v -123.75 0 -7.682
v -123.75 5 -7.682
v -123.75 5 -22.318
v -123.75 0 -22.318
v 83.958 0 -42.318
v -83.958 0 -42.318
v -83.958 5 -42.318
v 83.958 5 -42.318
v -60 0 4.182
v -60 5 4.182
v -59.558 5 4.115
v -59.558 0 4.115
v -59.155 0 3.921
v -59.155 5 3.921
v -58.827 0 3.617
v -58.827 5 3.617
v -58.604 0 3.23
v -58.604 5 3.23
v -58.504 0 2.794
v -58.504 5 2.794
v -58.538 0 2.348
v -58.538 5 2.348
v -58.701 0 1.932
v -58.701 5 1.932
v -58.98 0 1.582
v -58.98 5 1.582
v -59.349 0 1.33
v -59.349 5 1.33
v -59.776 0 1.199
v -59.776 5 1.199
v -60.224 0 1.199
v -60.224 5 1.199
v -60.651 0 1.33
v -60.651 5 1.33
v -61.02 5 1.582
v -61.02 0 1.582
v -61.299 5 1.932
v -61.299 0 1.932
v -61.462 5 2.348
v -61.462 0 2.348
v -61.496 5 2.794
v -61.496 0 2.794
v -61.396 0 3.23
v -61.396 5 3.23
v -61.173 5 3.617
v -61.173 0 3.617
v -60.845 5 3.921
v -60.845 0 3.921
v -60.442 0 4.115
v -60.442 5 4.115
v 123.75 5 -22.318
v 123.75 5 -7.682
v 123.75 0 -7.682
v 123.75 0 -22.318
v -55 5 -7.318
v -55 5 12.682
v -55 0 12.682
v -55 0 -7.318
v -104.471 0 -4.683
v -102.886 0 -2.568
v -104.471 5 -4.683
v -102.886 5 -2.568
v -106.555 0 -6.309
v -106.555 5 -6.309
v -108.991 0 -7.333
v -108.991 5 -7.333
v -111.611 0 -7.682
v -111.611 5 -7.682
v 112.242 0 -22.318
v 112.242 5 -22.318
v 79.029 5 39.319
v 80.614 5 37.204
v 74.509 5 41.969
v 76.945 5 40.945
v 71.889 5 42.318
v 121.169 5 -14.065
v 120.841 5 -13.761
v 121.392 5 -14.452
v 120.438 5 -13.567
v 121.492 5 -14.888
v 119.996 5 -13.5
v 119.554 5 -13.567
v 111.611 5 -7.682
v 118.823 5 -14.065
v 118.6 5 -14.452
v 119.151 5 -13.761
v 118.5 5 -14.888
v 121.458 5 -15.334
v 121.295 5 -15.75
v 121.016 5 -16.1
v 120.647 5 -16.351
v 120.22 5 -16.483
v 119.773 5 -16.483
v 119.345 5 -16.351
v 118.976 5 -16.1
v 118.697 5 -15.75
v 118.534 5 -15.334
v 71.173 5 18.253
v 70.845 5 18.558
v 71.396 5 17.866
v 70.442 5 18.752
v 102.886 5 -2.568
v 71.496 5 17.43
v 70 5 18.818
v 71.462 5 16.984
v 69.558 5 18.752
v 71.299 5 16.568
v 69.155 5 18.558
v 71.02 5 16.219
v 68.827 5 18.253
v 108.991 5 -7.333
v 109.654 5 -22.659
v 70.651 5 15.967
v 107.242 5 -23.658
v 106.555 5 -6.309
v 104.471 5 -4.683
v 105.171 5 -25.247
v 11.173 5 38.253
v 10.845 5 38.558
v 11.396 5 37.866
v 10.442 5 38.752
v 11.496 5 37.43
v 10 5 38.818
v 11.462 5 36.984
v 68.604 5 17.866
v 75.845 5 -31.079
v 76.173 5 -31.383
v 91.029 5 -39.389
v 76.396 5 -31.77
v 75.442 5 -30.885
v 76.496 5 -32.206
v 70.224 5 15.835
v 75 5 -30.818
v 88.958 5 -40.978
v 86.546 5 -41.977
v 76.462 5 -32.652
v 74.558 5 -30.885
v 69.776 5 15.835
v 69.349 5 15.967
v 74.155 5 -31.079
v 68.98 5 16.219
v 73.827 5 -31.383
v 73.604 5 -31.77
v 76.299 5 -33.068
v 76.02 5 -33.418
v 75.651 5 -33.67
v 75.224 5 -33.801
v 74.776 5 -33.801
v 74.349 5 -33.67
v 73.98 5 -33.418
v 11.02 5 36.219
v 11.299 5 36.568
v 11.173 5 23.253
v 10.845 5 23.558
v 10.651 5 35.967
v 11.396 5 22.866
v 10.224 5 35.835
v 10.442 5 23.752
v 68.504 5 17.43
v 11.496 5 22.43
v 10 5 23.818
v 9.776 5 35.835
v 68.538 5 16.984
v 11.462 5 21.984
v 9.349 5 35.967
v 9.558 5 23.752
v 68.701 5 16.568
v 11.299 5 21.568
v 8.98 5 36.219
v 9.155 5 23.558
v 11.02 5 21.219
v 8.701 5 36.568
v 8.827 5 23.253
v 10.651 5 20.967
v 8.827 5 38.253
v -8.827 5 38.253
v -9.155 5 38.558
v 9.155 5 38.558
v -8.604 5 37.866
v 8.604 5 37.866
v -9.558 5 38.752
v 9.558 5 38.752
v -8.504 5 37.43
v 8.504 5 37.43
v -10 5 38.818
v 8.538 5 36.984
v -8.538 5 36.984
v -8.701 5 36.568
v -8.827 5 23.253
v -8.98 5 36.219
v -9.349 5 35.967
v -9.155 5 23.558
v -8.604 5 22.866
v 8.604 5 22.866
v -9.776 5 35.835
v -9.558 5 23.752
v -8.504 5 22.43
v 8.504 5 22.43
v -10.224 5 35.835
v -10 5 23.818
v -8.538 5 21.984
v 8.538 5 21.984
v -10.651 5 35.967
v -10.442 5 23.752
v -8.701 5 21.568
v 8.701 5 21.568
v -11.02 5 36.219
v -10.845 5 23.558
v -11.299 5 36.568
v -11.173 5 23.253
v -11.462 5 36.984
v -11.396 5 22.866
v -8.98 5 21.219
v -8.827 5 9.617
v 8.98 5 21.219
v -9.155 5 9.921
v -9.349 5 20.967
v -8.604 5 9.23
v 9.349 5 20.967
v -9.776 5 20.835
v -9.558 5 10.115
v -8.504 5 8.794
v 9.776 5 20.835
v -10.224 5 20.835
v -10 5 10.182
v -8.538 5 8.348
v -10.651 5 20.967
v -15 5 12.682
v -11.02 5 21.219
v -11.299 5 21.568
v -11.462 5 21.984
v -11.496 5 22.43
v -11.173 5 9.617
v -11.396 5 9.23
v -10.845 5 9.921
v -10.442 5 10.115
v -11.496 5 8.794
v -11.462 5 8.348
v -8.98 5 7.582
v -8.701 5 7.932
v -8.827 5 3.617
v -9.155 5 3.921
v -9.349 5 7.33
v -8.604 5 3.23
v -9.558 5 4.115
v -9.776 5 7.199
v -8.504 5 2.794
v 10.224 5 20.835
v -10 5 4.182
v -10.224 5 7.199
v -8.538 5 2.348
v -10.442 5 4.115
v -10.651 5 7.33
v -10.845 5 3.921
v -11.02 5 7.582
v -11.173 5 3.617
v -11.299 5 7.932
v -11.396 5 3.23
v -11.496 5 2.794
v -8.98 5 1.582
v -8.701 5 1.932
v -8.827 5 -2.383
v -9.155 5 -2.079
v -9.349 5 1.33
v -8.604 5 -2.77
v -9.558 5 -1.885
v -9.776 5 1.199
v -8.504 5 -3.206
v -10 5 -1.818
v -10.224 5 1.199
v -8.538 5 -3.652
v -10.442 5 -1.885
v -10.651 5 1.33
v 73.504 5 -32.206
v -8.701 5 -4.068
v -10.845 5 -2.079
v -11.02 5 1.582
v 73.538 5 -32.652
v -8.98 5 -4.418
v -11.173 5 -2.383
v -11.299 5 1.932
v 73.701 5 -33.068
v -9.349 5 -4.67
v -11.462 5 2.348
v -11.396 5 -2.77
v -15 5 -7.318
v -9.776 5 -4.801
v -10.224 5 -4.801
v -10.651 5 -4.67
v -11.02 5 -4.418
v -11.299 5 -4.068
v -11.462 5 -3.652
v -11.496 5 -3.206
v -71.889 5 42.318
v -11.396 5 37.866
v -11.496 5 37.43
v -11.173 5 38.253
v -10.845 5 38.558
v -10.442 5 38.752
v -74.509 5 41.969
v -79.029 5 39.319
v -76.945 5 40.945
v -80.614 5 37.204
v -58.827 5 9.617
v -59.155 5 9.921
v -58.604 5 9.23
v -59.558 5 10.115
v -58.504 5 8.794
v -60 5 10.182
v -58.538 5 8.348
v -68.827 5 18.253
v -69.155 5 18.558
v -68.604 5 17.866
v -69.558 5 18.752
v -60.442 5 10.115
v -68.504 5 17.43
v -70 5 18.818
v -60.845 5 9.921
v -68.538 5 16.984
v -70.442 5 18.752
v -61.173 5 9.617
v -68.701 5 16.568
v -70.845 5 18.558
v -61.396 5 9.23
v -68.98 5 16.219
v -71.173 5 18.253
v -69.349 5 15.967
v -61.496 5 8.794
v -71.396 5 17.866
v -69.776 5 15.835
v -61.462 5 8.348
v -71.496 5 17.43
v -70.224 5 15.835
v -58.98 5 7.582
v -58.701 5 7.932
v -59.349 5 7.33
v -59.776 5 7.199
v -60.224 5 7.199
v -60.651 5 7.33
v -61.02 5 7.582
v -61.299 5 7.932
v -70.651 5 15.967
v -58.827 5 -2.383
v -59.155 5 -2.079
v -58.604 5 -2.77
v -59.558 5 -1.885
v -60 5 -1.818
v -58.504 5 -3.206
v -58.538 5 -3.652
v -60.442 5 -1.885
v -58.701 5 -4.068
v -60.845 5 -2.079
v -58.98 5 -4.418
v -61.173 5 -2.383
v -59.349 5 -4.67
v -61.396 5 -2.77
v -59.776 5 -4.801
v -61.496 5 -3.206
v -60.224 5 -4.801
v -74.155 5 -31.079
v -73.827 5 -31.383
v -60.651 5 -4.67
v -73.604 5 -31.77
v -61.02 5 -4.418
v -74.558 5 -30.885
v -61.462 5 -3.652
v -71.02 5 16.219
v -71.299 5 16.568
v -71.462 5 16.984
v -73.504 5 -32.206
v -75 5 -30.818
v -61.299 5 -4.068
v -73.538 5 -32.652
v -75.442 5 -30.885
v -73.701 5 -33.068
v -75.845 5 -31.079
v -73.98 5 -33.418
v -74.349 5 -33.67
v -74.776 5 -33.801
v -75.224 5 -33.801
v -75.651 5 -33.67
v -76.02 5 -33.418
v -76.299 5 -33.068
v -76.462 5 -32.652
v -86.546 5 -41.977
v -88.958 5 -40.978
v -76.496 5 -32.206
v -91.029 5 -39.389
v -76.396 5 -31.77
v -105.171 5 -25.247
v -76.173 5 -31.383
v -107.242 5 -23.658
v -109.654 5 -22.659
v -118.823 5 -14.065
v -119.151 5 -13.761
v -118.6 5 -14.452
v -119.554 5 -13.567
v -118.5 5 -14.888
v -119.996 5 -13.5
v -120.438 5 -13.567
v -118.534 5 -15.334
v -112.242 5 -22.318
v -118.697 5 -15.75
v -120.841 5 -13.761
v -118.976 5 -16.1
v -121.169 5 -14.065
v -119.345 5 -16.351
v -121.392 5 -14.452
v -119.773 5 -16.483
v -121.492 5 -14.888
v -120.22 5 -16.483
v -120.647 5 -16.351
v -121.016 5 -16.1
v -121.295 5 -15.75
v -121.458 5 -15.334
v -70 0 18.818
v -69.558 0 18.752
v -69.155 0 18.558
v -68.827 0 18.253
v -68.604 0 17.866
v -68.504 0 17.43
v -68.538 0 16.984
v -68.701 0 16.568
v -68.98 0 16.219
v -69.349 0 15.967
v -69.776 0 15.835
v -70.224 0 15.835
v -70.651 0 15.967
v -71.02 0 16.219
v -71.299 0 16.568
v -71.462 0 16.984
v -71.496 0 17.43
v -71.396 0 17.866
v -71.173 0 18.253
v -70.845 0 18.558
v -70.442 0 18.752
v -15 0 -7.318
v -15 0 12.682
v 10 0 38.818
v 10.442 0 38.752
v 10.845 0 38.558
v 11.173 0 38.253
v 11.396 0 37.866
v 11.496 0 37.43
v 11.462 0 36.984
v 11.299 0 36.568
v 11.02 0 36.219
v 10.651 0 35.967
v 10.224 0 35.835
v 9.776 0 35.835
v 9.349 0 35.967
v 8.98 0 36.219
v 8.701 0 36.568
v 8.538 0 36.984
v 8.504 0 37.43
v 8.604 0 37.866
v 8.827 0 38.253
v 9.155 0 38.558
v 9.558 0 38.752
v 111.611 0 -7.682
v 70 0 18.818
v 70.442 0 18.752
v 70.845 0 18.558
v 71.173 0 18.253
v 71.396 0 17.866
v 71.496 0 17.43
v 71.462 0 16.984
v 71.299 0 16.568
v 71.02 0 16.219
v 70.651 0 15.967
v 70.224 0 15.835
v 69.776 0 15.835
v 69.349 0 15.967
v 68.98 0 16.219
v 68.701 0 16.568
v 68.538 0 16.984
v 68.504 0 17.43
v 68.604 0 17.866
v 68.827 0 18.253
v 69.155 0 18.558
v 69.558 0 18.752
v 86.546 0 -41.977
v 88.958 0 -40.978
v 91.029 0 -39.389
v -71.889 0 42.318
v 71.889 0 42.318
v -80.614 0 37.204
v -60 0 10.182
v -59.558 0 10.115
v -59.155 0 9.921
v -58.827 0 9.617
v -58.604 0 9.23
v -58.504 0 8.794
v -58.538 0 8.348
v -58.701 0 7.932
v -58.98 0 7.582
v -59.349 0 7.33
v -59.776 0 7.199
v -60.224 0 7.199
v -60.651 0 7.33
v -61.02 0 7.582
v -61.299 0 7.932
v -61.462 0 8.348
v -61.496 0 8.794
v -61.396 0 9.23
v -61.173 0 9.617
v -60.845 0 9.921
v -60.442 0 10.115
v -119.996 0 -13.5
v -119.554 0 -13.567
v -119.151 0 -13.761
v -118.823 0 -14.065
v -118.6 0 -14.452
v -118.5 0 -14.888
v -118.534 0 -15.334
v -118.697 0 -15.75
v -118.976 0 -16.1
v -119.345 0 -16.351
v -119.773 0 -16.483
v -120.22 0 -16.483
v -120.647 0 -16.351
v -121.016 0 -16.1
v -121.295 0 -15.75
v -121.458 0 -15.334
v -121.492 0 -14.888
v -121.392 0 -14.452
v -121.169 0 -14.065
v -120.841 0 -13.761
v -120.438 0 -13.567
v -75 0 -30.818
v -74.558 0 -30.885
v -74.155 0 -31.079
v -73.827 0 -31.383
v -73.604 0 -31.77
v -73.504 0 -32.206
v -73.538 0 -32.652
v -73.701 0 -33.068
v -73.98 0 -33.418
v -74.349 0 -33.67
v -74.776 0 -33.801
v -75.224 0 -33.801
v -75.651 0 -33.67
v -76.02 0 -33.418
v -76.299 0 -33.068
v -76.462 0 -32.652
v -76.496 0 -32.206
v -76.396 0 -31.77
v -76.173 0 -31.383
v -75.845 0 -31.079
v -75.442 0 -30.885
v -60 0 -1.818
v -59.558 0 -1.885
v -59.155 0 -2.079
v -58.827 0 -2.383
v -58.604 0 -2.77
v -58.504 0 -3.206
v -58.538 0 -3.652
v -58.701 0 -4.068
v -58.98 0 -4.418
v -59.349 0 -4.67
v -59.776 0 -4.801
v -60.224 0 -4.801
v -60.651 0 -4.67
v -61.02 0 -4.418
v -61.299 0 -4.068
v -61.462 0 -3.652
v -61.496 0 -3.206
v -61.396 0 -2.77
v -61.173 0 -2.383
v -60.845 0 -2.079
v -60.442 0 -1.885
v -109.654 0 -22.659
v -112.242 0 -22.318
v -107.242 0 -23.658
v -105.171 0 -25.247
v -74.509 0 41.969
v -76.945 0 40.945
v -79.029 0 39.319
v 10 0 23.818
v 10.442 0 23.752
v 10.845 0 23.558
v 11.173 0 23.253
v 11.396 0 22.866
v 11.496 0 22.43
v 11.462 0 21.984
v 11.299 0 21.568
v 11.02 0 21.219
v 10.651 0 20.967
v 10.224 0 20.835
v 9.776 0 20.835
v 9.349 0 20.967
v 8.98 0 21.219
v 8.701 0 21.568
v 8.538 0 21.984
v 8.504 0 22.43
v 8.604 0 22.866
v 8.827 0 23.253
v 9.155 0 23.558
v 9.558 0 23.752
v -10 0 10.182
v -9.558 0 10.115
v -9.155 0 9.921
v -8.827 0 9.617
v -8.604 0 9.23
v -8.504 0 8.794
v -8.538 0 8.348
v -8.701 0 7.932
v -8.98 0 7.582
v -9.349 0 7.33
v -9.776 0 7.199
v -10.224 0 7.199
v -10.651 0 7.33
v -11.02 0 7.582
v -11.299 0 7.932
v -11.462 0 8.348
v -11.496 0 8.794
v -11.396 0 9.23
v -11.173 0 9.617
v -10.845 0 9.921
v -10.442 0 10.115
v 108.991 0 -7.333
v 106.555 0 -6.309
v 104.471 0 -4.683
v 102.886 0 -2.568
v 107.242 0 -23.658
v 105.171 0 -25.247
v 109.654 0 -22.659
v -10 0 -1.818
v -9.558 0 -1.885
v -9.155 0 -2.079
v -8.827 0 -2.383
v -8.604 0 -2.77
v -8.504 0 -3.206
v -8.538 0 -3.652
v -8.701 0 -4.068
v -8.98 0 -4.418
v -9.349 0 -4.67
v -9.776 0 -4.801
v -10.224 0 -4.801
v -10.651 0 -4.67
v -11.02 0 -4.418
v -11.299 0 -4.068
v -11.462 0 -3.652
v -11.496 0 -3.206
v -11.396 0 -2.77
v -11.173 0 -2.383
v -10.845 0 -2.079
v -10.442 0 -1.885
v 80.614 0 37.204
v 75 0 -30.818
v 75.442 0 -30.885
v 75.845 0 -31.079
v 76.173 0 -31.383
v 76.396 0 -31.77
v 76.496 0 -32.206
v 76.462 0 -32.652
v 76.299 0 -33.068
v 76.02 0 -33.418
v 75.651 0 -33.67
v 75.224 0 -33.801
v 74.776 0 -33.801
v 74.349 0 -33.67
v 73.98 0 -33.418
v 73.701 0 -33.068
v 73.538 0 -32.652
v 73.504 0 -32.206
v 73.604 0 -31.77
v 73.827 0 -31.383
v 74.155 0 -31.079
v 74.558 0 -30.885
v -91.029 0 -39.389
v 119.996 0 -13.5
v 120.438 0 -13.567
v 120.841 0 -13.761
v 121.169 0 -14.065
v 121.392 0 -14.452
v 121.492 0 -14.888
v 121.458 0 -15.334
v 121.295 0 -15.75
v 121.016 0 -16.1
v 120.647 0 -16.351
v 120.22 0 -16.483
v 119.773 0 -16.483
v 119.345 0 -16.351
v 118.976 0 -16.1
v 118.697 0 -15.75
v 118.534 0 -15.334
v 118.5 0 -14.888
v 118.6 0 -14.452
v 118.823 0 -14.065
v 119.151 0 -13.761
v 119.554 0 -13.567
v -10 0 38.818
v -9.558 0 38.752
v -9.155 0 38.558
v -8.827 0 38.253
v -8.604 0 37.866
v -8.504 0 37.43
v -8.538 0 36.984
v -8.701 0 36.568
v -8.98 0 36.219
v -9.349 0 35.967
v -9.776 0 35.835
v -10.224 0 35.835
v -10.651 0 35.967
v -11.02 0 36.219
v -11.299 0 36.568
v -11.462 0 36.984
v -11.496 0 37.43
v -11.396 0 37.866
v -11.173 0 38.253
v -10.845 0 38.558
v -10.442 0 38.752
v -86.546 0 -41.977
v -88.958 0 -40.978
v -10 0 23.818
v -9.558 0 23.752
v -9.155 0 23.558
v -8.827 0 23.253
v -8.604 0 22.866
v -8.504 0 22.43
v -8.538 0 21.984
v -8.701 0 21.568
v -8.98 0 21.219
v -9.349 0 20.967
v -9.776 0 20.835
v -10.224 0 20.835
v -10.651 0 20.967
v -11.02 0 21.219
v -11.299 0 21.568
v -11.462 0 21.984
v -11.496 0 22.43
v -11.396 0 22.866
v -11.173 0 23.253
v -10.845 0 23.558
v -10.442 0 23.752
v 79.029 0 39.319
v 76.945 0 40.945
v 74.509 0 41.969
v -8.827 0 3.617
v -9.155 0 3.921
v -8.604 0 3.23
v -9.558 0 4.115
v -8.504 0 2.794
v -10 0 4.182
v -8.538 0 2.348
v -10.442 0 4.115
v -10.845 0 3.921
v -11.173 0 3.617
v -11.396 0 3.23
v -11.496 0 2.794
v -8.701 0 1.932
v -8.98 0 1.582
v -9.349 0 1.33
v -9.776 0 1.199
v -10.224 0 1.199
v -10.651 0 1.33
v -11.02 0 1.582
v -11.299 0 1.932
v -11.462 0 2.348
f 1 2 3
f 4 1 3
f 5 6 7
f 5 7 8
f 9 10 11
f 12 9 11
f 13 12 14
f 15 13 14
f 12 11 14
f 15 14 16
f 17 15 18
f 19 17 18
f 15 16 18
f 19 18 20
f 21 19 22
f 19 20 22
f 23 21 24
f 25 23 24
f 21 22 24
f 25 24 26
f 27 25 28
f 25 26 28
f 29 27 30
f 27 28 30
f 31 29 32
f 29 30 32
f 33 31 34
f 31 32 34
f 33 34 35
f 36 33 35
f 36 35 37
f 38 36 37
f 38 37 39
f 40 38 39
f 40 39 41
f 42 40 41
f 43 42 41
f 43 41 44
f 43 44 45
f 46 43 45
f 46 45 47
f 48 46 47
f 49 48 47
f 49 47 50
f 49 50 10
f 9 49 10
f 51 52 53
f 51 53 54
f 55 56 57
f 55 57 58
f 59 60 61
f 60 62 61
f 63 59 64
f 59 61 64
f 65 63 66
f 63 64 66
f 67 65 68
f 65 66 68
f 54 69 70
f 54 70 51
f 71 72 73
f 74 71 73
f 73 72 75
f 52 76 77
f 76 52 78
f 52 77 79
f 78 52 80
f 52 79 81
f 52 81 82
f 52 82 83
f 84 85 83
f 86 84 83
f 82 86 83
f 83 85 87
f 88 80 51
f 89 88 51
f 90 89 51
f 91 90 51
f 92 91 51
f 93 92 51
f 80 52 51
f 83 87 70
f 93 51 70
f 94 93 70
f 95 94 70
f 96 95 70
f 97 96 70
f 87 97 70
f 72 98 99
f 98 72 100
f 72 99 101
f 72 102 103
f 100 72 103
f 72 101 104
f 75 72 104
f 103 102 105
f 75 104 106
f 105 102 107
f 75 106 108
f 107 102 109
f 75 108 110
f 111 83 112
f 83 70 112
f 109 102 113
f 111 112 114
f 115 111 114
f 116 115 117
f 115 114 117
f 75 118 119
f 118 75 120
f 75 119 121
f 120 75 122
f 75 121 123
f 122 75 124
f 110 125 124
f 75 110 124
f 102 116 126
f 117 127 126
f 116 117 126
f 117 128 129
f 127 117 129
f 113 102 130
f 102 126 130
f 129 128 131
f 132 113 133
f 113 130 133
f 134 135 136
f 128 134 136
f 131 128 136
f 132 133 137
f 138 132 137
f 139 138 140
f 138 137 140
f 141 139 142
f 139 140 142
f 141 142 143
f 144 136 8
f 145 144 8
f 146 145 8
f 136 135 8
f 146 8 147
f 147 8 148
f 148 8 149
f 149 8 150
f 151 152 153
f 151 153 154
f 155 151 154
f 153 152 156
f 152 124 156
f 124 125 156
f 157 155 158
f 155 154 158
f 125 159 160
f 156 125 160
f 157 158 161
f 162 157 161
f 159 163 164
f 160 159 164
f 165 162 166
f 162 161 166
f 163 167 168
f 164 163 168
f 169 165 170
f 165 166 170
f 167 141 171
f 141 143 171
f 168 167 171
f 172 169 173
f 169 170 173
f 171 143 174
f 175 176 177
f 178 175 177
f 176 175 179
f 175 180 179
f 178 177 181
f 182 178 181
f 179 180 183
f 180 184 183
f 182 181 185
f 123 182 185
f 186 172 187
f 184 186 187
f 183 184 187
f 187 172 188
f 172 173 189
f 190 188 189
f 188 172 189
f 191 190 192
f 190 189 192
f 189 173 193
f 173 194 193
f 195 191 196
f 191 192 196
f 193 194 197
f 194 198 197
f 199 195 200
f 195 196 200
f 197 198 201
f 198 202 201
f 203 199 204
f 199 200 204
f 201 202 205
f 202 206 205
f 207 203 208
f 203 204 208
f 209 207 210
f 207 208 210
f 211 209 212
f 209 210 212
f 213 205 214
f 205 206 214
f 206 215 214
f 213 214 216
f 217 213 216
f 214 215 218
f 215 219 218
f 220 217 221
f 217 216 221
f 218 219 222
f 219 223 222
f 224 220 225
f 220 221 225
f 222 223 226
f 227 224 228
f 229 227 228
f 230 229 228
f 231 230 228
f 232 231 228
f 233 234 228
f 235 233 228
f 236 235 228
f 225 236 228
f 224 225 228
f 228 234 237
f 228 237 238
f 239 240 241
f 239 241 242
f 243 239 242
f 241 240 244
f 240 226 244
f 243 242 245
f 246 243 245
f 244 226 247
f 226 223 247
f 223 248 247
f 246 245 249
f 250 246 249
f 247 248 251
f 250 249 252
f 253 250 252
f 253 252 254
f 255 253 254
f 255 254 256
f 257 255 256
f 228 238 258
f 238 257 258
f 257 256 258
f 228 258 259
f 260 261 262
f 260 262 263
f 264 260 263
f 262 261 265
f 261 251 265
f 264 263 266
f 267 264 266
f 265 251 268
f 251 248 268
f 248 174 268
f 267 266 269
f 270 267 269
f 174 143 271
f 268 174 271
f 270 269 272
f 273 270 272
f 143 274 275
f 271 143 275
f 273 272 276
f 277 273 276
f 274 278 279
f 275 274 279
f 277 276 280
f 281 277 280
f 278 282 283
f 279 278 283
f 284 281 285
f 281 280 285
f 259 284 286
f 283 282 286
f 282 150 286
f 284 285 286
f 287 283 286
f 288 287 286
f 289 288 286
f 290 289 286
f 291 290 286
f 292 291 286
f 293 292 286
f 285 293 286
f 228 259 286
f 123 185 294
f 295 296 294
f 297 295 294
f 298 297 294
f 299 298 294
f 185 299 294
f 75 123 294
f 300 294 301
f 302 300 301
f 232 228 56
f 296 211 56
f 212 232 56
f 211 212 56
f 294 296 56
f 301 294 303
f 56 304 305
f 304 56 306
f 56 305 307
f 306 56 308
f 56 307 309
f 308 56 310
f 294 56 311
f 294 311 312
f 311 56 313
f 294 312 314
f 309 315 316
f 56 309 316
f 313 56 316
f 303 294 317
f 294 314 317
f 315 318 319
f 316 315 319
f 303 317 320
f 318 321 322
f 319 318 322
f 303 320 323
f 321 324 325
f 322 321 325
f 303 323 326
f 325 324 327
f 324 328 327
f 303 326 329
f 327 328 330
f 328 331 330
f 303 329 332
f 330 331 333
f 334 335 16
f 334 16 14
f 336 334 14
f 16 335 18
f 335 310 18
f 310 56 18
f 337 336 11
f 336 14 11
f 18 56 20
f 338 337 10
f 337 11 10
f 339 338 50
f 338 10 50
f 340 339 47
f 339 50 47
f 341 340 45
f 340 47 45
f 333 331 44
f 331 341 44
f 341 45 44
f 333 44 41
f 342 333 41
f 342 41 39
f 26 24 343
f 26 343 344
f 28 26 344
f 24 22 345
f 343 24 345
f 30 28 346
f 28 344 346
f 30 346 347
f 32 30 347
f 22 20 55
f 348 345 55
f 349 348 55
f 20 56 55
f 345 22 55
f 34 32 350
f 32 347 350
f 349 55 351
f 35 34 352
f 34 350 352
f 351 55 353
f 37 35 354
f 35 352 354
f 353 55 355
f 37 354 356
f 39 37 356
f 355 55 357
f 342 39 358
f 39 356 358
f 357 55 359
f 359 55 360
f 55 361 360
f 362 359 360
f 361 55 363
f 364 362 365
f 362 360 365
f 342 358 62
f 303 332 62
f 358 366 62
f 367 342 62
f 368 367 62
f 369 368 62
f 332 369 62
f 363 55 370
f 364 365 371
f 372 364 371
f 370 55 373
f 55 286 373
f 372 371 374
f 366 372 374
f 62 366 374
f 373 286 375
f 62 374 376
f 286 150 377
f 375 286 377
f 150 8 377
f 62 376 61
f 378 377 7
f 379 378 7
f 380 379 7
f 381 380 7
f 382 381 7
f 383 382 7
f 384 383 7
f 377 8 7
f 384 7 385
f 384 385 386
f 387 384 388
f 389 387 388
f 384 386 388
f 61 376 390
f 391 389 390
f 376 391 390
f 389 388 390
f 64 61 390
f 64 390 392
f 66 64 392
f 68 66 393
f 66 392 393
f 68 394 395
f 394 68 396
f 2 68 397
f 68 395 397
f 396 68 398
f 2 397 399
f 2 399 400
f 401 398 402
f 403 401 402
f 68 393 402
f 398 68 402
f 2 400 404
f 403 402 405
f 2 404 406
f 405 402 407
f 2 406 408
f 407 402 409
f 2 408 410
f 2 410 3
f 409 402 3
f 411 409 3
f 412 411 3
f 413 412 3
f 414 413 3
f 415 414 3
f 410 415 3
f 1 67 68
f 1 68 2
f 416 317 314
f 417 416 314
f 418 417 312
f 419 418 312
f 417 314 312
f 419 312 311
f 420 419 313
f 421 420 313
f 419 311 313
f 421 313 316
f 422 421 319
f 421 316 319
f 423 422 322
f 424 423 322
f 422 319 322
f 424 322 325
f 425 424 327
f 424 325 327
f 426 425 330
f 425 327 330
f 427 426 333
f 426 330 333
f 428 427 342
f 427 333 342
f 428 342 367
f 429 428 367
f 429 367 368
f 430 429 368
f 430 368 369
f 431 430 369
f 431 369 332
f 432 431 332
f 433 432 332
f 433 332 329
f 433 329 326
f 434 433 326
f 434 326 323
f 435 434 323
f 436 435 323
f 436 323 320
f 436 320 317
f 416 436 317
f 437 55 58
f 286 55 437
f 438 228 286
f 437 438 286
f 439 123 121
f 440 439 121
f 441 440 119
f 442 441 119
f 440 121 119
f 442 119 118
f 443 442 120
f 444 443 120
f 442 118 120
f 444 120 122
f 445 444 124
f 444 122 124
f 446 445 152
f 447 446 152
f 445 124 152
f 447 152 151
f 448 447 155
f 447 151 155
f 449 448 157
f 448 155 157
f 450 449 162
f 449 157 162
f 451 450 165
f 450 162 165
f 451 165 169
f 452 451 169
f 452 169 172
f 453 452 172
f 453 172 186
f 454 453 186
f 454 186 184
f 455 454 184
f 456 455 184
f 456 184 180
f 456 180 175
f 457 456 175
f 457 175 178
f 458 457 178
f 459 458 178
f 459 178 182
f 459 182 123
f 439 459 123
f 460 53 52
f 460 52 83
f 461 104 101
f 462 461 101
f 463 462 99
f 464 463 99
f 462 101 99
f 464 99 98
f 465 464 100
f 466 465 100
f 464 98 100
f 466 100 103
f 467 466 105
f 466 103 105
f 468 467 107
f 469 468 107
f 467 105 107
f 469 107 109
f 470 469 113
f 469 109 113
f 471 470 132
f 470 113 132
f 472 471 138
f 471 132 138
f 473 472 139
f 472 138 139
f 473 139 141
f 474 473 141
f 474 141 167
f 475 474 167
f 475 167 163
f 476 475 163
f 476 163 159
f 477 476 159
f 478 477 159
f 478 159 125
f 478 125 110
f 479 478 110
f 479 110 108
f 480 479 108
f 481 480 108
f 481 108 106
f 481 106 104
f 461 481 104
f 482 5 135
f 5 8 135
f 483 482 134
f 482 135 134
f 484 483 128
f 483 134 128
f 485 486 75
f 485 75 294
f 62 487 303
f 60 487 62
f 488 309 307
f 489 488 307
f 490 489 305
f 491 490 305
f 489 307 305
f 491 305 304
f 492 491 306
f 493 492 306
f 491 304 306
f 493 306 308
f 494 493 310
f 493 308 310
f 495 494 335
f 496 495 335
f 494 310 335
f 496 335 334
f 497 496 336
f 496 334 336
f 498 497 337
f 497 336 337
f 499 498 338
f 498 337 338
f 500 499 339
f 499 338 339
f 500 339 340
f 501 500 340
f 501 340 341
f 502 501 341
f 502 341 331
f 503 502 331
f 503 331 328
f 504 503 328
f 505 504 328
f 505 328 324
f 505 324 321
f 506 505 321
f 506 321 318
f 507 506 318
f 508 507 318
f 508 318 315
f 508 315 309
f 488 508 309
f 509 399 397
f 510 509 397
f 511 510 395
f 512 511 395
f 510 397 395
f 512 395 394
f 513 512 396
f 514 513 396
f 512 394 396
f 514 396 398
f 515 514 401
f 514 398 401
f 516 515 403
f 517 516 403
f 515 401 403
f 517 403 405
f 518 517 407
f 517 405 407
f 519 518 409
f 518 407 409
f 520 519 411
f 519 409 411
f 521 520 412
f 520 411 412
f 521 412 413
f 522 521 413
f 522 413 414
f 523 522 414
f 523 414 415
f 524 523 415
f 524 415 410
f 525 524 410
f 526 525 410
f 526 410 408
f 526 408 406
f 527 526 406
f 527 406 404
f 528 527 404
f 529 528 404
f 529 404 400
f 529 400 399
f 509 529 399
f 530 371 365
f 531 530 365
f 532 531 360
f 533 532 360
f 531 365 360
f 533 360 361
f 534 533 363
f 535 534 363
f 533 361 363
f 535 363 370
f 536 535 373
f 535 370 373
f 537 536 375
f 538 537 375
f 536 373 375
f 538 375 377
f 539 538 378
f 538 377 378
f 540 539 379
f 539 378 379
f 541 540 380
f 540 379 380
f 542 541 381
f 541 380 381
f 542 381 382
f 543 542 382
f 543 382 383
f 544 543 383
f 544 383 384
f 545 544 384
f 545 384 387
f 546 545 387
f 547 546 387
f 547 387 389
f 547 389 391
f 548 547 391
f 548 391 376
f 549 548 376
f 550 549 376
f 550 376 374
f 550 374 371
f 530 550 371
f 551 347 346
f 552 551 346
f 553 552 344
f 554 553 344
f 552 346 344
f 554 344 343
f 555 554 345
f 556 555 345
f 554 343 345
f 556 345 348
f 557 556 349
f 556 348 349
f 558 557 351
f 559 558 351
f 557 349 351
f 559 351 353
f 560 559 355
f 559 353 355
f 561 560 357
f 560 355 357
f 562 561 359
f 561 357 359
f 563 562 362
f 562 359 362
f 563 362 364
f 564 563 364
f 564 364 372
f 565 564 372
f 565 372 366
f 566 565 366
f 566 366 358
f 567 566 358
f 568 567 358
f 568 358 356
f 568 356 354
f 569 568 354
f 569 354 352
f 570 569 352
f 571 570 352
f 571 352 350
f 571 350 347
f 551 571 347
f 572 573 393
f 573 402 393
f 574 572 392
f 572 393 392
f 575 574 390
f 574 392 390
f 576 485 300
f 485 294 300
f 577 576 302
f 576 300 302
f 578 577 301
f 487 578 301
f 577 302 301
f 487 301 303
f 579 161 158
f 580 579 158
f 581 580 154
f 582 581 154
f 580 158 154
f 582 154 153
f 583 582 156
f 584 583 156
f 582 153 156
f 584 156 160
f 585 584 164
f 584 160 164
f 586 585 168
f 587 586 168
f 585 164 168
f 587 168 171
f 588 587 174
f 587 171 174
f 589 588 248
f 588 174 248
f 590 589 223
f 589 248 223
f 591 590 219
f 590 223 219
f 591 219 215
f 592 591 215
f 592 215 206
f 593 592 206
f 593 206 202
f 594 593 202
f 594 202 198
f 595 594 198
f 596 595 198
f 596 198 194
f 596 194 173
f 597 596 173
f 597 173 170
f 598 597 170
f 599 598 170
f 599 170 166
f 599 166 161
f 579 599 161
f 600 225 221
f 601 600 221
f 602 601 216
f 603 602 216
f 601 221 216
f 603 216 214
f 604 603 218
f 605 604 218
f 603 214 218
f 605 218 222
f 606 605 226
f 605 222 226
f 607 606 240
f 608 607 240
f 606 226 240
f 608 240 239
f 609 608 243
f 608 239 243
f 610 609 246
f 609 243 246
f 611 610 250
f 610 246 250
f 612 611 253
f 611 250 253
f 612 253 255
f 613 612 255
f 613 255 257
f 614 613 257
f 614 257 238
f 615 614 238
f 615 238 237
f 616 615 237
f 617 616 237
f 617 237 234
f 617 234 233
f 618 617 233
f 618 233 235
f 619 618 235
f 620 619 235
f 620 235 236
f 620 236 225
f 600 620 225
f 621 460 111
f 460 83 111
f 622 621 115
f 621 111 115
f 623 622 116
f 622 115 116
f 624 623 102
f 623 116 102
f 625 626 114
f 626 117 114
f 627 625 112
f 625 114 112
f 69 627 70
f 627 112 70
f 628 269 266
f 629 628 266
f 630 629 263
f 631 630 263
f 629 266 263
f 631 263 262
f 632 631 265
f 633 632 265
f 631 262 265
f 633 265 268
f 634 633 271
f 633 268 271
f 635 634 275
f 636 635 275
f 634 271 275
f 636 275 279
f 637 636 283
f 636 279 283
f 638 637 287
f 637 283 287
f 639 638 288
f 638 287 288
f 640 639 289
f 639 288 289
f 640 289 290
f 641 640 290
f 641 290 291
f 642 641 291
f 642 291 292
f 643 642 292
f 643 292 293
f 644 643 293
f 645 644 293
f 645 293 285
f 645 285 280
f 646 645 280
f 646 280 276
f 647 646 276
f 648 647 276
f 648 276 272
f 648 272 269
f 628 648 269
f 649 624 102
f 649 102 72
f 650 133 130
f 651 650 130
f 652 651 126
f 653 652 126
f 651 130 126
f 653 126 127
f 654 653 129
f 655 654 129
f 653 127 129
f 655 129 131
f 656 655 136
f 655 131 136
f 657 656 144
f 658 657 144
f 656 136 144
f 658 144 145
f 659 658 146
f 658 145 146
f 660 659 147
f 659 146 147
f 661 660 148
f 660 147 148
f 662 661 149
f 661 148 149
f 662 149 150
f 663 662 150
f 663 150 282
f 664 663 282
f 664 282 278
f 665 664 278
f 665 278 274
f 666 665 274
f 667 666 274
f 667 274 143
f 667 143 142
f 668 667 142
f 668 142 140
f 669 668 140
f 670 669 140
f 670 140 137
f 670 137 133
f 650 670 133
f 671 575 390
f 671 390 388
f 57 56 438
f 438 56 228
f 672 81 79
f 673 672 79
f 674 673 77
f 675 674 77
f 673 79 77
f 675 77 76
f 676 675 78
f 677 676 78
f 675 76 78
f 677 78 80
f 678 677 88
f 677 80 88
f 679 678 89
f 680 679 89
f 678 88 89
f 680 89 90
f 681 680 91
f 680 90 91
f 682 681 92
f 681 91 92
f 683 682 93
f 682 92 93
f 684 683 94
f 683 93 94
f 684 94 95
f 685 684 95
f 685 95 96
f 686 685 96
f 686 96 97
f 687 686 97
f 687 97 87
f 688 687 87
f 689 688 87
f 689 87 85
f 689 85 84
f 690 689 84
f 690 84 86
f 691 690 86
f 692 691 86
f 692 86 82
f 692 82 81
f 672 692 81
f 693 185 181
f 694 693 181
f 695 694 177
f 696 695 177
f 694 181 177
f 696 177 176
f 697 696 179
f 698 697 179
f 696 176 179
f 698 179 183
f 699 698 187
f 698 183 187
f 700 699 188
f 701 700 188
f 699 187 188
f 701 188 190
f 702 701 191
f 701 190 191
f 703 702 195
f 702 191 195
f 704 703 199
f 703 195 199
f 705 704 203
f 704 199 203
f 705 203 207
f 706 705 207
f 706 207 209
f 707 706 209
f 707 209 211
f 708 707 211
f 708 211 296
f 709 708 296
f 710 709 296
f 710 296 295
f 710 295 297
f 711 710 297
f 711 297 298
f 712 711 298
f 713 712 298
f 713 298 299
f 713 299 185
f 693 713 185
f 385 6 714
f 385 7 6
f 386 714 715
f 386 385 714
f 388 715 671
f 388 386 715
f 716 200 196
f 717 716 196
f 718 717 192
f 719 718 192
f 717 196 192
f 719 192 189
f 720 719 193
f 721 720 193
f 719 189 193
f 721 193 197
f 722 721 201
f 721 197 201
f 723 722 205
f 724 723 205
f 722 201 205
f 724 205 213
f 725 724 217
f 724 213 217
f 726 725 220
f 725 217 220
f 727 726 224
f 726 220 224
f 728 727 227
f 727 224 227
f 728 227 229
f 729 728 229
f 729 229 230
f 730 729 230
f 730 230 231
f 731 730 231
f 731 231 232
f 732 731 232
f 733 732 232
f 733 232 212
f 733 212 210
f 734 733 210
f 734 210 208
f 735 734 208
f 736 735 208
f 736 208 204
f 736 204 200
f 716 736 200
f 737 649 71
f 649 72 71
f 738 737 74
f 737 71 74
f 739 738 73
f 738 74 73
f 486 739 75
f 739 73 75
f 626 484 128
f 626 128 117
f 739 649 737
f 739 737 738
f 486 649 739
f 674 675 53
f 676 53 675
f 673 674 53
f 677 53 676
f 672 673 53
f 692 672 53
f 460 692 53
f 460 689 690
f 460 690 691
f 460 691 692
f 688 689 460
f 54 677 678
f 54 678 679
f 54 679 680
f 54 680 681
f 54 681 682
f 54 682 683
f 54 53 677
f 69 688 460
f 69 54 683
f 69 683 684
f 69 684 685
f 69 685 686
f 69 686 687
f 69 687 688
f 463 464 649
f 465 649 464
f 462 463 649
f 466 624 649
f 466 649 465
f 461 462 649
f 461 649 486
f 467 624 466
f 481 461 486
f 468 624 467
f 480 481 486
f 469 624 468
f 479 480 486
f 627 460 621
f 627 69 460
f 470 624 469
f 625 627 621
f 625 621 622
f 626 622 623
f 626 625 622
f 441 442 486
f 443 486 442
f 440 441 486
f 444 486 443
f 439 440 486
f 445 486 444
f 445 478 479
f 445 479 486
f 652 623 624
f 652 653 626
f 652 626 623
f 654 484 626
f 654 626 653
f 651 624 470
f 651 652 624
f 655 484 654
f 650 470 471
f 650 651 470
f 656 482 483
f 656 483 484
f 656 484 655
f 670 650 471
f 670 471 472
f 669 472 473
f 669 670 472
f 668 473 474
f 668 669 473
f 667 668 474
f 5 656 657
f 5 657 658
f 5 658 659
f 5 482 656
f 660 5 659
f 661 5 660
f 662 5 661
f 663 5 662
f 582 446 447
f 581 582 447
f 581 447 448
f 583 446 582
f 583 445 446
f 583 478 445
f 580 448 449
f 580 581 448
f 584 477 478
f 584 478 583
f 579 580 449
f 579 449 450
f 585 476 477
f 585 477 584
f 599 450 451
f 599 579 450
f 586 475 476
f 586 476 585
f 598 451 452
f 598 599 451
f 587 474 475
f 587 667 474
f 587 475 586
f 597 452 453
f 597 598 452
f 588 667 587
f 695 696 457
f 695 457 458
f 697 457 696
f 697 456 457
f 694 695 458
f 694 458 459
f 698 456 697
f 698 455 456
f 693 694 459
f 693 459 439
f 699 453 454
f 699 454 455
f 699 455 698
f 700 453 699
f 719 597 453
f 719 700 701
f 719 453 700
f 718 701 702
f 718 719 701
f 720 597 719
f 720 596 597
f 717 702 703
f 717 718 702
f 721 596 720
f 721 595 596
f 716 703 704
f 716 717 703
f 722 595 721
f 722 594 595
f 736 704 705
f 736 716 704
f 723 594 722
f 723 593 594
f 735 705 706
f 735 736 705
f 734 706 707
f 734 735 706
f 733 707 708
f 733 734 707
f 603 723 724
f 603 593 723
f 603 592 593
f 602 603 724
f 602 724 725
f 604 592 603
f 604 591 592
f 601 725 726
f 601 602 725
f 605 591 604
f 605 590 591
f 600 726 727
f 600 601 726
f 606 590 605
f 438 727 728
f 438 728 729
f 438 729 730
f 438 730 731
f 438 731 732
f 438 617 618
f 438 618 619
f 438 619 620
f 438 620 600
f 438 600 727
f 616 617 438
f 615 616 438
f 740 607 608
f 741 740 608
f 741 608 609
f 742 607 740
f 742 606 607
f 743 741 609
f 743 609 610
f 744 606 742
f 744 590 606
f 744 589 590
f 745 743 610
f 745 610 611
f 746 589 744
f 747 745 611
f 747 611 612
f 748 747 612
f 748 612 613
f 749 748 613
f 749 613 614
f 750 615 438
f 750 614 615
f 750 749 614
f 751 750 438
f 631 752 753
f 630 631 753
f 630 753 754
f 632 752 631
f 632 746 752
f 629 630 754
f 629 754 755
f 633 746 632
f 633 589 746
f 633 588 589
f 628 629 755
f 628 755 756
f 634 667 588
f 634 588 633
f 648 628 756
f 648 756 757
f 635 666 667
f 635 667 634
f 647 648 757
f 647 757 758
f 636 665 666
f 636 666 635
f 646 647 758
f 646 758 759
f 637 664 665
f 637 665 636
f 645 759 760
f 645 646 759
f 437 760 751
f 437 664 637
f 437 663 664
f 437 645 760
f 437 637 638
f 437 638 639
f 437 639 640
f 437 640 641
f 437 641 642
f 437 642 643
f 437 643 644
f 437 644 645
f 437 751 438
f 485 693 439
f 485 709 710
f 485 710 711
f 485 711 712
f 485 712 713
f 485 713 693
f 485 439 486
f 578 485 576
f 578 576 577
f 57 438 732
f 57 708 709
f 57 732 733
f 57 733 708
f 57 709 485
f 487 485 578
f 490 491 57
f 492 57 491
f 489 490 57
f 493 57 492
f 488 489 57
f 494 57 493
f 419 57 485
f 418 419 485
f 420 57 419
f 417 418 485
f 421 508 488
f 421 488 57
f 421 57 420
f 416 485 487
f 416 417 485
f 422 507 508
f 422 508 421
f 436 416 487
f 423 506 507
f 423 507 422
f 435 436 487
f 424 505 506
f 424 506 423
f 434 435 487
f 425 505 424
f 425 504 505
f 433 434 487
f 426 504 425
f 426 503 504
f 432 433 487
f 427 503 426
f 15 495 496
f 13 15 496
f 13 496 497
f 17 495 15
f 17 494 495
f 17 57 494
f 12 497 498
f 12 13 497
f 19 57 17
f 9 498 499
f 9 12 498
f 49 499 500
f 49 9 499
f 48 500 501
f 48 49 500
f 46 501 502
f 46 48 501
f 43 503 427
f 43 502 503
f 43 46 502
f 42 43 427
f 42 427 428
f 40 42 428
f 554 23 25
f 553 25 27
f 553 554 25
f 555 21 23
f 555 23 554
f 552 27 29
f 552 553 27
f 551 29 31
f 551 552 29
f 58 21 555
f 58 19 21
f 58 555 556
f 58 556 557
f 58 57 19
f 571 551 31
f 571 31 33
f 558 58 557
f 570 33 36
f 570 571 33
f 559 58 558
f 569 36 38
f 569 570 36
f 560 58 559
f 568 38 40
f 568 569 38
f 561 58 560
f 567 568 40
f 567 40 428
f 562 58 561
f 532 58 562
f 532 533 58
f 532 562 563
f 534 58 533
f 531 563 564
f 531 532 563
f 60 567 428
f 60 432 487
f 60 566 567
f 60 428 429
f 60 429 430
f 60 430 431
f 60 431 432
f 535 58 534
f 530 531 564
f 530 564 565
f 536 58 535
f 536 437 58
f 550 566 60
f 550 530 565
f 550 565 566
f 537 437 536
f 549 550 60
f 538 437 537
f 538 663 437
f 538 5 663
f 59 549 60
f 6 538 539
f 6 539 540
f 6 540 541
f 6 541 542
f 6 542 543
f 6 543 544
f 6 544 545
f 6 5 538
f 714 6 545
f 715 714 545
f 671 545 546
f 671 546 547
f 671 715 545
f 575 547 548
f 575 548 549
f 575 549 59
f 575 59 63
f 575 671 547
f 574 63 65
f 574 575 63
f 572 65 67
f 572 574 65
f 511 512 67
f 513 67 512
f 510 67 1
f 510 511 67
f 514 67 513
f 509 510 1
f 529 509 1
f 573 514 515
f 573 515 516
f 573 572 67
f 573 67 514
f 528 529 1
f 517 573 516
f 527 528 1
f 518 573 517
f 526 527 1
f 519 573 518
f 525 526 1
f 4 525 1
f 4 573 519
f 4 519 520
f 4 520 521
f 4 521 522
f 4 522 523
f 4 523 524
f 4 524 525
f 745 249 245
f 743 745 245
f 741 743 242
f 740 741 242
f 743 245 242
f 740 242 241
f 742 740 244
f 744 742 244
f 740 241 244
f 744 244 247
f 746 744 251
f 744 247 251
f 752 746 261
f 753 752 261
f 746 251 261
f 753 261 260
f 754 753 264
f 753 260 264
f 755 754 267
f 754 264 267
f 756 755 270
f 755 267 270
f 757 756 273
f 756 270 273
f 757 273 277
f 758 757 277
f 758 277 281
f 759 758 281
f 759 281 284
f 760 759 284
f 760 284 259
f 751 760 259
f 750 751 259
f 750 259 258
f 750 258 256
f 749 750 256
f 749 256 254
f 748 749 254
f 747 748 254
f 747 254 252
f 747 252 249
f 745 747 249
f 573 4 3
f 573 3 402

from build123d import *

# Parameters (mm, degrees)
SALIENTE_EXTRUIR1_DEPTH = 5
REDONDEO1_R             = 10
CROQUIS2_R              = 1.5
CROQUIS2_W              = 40
CROQUIS2_H              = 20
CORTAR_EXTRUIR1_DEPTH   = 135.669558943
CROQUIS3_W              = 4
CROQUIS3_H              = 14.636342218
CORTAR_EXTRUIR2_DEPTH   = 135.669558943


with BuildPart() as part:
    # Croquis1 → Saliente-Extruir1 (new body)
    with BuildSketch(Plane(origin=(0, 0, 0), x_dir=(1, 0, 0), z_dir=(0, 1, 0))):
        Polygon((-88.1, 42.318171109), (88.1, 42.318171109), (108.1, 22.318171109), (127.75, 22.318171109), (127.75, 7.681828891), (105.75, 7.681828891), (77.75, -42.318171109), (-77.75, -42.318171109), (-105.75, 7.681828891), (-127.75, 7.681828891), (-127.75, 22.318171109), (-108.1, 22.318171109), align=None)
    extrude(amount=SALIENTE_EXTRUIR1_DEPTH)

    # Redondeo1
    redondeo1_edges = [part.edges().sort_by_distance(p)[0] for p in [
        (-88.1, 2.5, -42.318171109),
        (88.1, 2.5, -42.318171109),
        (108.1, 2.5, -22.318171109),
        (105.75, 2.5, -7.681828891),
        (77.75, 2.5, 42.318171109),
        (-77.75, 2.5, 42.318171109),
        (-105.75, 2.5, -7.681828891),
        (-108.1, 2.5, -22.318171109),
    ]]
    fillet(redondeo1_edges, radius=REDONDEO1_R)

    # Croquis2 → Cortar-Extruir1 (cut, through all)
    with BuildSketch(Plane(origin=(0, 5, 0), x_dir=(1, 0, 0), z_dir=(0, 1, 0))):
        with Locations(Location((70, -17.318171109, 0), (0, 0, 270))):
            Circle(CROQUIS2_R)
        with Locations(Location((-70, -17.318171109, 0), (0, 0, 270))):
            Circle(CROQUIS2_R)
        with Locations(Location((-119.996067812, 15, 0), (0, 0, 270))):
            Circle(CROQUIS2_R)
        with Locations(Location((119.996067812, 15, 0), (0, 0, 270))):
            Circle(CROQUIS2_R)
        with Locations(Location((-75, 32.318171109, 0), (0, 0, 270))):
            Circle(CROQUIS2_R)
        with Locations(Location((75, 32.318171109, 0), (0, 0, 270))):
            Circle(CROQUIS2_R)
        with Locations(Location((-10, -22.318171109, 0), (0, 0, 270))):
            Circle(CROQUIS2_R)
        with Locations(Location((10, -22.318171109, 0), (0, 0, 270))):
            Circle(CROQUIS2_R)
        with Locations(Location((-10, -37.318171109, 0), (0, 0, 270))):
            Circle(CROQUIS2_R)
        with Locations(Location((10, -37.318171109, 0), (0, 0, 270))):
            Circle(CROQUIS2_R)
        with Locations(Location((-60, -2.681828891, 0), (0, 0, 270))):
            Circle(CROQUIS2_R)
        with Locations(Location((-10, -2.681828891, 0), (0, 0, 270))):
            Circle(CROQUIS2_R)
        with Locations(Location((-60, 3.318171109, 0), (0, 0, 270))):
            Circle(CROQUIS2_R)
        with Locations(Location((-60, -8.681828891, 0), (0, 0, 270))):
            Circle(CROQUIS2_R)
        with Locations(Location((-10, 3.318171109, 0), (0, 0, 270))):
            Circle(CROQUIS2_R)
        with Locations(Location((-10, -8.681828891, 0), (0, 0, 270))):
            Circle(CROQUIS2_R)
        with Locations((-35, -2.681828891)):
            Rectangle(CROQUIS2_W, CROQUIS2_H)
    extrude(amount=-CORTAR_EXTRUIR1_DEPTH, mode=Mode.SUBTRACT)

    # Croquis3 → Cortar-Extruir2 (cut, through all)
    with BuildSketch(Plane(origin=(0, 5, 0), x_dir=(1, 0, 0), z_dir=(0, 1, 0))):
        with Locations((-125.75, 15)):
            Rectangle(CROQUIS3_W, CROQUIS3_H)
        with Locations((125.75, 15)):
            Rectangle(CROQUIS3_W, CROQUIS3_H)
    extrude(amount=-CORTAR_EXTRUIR2_DEPTH, mode=Mode.SUBTRACT)


solid = part.part
